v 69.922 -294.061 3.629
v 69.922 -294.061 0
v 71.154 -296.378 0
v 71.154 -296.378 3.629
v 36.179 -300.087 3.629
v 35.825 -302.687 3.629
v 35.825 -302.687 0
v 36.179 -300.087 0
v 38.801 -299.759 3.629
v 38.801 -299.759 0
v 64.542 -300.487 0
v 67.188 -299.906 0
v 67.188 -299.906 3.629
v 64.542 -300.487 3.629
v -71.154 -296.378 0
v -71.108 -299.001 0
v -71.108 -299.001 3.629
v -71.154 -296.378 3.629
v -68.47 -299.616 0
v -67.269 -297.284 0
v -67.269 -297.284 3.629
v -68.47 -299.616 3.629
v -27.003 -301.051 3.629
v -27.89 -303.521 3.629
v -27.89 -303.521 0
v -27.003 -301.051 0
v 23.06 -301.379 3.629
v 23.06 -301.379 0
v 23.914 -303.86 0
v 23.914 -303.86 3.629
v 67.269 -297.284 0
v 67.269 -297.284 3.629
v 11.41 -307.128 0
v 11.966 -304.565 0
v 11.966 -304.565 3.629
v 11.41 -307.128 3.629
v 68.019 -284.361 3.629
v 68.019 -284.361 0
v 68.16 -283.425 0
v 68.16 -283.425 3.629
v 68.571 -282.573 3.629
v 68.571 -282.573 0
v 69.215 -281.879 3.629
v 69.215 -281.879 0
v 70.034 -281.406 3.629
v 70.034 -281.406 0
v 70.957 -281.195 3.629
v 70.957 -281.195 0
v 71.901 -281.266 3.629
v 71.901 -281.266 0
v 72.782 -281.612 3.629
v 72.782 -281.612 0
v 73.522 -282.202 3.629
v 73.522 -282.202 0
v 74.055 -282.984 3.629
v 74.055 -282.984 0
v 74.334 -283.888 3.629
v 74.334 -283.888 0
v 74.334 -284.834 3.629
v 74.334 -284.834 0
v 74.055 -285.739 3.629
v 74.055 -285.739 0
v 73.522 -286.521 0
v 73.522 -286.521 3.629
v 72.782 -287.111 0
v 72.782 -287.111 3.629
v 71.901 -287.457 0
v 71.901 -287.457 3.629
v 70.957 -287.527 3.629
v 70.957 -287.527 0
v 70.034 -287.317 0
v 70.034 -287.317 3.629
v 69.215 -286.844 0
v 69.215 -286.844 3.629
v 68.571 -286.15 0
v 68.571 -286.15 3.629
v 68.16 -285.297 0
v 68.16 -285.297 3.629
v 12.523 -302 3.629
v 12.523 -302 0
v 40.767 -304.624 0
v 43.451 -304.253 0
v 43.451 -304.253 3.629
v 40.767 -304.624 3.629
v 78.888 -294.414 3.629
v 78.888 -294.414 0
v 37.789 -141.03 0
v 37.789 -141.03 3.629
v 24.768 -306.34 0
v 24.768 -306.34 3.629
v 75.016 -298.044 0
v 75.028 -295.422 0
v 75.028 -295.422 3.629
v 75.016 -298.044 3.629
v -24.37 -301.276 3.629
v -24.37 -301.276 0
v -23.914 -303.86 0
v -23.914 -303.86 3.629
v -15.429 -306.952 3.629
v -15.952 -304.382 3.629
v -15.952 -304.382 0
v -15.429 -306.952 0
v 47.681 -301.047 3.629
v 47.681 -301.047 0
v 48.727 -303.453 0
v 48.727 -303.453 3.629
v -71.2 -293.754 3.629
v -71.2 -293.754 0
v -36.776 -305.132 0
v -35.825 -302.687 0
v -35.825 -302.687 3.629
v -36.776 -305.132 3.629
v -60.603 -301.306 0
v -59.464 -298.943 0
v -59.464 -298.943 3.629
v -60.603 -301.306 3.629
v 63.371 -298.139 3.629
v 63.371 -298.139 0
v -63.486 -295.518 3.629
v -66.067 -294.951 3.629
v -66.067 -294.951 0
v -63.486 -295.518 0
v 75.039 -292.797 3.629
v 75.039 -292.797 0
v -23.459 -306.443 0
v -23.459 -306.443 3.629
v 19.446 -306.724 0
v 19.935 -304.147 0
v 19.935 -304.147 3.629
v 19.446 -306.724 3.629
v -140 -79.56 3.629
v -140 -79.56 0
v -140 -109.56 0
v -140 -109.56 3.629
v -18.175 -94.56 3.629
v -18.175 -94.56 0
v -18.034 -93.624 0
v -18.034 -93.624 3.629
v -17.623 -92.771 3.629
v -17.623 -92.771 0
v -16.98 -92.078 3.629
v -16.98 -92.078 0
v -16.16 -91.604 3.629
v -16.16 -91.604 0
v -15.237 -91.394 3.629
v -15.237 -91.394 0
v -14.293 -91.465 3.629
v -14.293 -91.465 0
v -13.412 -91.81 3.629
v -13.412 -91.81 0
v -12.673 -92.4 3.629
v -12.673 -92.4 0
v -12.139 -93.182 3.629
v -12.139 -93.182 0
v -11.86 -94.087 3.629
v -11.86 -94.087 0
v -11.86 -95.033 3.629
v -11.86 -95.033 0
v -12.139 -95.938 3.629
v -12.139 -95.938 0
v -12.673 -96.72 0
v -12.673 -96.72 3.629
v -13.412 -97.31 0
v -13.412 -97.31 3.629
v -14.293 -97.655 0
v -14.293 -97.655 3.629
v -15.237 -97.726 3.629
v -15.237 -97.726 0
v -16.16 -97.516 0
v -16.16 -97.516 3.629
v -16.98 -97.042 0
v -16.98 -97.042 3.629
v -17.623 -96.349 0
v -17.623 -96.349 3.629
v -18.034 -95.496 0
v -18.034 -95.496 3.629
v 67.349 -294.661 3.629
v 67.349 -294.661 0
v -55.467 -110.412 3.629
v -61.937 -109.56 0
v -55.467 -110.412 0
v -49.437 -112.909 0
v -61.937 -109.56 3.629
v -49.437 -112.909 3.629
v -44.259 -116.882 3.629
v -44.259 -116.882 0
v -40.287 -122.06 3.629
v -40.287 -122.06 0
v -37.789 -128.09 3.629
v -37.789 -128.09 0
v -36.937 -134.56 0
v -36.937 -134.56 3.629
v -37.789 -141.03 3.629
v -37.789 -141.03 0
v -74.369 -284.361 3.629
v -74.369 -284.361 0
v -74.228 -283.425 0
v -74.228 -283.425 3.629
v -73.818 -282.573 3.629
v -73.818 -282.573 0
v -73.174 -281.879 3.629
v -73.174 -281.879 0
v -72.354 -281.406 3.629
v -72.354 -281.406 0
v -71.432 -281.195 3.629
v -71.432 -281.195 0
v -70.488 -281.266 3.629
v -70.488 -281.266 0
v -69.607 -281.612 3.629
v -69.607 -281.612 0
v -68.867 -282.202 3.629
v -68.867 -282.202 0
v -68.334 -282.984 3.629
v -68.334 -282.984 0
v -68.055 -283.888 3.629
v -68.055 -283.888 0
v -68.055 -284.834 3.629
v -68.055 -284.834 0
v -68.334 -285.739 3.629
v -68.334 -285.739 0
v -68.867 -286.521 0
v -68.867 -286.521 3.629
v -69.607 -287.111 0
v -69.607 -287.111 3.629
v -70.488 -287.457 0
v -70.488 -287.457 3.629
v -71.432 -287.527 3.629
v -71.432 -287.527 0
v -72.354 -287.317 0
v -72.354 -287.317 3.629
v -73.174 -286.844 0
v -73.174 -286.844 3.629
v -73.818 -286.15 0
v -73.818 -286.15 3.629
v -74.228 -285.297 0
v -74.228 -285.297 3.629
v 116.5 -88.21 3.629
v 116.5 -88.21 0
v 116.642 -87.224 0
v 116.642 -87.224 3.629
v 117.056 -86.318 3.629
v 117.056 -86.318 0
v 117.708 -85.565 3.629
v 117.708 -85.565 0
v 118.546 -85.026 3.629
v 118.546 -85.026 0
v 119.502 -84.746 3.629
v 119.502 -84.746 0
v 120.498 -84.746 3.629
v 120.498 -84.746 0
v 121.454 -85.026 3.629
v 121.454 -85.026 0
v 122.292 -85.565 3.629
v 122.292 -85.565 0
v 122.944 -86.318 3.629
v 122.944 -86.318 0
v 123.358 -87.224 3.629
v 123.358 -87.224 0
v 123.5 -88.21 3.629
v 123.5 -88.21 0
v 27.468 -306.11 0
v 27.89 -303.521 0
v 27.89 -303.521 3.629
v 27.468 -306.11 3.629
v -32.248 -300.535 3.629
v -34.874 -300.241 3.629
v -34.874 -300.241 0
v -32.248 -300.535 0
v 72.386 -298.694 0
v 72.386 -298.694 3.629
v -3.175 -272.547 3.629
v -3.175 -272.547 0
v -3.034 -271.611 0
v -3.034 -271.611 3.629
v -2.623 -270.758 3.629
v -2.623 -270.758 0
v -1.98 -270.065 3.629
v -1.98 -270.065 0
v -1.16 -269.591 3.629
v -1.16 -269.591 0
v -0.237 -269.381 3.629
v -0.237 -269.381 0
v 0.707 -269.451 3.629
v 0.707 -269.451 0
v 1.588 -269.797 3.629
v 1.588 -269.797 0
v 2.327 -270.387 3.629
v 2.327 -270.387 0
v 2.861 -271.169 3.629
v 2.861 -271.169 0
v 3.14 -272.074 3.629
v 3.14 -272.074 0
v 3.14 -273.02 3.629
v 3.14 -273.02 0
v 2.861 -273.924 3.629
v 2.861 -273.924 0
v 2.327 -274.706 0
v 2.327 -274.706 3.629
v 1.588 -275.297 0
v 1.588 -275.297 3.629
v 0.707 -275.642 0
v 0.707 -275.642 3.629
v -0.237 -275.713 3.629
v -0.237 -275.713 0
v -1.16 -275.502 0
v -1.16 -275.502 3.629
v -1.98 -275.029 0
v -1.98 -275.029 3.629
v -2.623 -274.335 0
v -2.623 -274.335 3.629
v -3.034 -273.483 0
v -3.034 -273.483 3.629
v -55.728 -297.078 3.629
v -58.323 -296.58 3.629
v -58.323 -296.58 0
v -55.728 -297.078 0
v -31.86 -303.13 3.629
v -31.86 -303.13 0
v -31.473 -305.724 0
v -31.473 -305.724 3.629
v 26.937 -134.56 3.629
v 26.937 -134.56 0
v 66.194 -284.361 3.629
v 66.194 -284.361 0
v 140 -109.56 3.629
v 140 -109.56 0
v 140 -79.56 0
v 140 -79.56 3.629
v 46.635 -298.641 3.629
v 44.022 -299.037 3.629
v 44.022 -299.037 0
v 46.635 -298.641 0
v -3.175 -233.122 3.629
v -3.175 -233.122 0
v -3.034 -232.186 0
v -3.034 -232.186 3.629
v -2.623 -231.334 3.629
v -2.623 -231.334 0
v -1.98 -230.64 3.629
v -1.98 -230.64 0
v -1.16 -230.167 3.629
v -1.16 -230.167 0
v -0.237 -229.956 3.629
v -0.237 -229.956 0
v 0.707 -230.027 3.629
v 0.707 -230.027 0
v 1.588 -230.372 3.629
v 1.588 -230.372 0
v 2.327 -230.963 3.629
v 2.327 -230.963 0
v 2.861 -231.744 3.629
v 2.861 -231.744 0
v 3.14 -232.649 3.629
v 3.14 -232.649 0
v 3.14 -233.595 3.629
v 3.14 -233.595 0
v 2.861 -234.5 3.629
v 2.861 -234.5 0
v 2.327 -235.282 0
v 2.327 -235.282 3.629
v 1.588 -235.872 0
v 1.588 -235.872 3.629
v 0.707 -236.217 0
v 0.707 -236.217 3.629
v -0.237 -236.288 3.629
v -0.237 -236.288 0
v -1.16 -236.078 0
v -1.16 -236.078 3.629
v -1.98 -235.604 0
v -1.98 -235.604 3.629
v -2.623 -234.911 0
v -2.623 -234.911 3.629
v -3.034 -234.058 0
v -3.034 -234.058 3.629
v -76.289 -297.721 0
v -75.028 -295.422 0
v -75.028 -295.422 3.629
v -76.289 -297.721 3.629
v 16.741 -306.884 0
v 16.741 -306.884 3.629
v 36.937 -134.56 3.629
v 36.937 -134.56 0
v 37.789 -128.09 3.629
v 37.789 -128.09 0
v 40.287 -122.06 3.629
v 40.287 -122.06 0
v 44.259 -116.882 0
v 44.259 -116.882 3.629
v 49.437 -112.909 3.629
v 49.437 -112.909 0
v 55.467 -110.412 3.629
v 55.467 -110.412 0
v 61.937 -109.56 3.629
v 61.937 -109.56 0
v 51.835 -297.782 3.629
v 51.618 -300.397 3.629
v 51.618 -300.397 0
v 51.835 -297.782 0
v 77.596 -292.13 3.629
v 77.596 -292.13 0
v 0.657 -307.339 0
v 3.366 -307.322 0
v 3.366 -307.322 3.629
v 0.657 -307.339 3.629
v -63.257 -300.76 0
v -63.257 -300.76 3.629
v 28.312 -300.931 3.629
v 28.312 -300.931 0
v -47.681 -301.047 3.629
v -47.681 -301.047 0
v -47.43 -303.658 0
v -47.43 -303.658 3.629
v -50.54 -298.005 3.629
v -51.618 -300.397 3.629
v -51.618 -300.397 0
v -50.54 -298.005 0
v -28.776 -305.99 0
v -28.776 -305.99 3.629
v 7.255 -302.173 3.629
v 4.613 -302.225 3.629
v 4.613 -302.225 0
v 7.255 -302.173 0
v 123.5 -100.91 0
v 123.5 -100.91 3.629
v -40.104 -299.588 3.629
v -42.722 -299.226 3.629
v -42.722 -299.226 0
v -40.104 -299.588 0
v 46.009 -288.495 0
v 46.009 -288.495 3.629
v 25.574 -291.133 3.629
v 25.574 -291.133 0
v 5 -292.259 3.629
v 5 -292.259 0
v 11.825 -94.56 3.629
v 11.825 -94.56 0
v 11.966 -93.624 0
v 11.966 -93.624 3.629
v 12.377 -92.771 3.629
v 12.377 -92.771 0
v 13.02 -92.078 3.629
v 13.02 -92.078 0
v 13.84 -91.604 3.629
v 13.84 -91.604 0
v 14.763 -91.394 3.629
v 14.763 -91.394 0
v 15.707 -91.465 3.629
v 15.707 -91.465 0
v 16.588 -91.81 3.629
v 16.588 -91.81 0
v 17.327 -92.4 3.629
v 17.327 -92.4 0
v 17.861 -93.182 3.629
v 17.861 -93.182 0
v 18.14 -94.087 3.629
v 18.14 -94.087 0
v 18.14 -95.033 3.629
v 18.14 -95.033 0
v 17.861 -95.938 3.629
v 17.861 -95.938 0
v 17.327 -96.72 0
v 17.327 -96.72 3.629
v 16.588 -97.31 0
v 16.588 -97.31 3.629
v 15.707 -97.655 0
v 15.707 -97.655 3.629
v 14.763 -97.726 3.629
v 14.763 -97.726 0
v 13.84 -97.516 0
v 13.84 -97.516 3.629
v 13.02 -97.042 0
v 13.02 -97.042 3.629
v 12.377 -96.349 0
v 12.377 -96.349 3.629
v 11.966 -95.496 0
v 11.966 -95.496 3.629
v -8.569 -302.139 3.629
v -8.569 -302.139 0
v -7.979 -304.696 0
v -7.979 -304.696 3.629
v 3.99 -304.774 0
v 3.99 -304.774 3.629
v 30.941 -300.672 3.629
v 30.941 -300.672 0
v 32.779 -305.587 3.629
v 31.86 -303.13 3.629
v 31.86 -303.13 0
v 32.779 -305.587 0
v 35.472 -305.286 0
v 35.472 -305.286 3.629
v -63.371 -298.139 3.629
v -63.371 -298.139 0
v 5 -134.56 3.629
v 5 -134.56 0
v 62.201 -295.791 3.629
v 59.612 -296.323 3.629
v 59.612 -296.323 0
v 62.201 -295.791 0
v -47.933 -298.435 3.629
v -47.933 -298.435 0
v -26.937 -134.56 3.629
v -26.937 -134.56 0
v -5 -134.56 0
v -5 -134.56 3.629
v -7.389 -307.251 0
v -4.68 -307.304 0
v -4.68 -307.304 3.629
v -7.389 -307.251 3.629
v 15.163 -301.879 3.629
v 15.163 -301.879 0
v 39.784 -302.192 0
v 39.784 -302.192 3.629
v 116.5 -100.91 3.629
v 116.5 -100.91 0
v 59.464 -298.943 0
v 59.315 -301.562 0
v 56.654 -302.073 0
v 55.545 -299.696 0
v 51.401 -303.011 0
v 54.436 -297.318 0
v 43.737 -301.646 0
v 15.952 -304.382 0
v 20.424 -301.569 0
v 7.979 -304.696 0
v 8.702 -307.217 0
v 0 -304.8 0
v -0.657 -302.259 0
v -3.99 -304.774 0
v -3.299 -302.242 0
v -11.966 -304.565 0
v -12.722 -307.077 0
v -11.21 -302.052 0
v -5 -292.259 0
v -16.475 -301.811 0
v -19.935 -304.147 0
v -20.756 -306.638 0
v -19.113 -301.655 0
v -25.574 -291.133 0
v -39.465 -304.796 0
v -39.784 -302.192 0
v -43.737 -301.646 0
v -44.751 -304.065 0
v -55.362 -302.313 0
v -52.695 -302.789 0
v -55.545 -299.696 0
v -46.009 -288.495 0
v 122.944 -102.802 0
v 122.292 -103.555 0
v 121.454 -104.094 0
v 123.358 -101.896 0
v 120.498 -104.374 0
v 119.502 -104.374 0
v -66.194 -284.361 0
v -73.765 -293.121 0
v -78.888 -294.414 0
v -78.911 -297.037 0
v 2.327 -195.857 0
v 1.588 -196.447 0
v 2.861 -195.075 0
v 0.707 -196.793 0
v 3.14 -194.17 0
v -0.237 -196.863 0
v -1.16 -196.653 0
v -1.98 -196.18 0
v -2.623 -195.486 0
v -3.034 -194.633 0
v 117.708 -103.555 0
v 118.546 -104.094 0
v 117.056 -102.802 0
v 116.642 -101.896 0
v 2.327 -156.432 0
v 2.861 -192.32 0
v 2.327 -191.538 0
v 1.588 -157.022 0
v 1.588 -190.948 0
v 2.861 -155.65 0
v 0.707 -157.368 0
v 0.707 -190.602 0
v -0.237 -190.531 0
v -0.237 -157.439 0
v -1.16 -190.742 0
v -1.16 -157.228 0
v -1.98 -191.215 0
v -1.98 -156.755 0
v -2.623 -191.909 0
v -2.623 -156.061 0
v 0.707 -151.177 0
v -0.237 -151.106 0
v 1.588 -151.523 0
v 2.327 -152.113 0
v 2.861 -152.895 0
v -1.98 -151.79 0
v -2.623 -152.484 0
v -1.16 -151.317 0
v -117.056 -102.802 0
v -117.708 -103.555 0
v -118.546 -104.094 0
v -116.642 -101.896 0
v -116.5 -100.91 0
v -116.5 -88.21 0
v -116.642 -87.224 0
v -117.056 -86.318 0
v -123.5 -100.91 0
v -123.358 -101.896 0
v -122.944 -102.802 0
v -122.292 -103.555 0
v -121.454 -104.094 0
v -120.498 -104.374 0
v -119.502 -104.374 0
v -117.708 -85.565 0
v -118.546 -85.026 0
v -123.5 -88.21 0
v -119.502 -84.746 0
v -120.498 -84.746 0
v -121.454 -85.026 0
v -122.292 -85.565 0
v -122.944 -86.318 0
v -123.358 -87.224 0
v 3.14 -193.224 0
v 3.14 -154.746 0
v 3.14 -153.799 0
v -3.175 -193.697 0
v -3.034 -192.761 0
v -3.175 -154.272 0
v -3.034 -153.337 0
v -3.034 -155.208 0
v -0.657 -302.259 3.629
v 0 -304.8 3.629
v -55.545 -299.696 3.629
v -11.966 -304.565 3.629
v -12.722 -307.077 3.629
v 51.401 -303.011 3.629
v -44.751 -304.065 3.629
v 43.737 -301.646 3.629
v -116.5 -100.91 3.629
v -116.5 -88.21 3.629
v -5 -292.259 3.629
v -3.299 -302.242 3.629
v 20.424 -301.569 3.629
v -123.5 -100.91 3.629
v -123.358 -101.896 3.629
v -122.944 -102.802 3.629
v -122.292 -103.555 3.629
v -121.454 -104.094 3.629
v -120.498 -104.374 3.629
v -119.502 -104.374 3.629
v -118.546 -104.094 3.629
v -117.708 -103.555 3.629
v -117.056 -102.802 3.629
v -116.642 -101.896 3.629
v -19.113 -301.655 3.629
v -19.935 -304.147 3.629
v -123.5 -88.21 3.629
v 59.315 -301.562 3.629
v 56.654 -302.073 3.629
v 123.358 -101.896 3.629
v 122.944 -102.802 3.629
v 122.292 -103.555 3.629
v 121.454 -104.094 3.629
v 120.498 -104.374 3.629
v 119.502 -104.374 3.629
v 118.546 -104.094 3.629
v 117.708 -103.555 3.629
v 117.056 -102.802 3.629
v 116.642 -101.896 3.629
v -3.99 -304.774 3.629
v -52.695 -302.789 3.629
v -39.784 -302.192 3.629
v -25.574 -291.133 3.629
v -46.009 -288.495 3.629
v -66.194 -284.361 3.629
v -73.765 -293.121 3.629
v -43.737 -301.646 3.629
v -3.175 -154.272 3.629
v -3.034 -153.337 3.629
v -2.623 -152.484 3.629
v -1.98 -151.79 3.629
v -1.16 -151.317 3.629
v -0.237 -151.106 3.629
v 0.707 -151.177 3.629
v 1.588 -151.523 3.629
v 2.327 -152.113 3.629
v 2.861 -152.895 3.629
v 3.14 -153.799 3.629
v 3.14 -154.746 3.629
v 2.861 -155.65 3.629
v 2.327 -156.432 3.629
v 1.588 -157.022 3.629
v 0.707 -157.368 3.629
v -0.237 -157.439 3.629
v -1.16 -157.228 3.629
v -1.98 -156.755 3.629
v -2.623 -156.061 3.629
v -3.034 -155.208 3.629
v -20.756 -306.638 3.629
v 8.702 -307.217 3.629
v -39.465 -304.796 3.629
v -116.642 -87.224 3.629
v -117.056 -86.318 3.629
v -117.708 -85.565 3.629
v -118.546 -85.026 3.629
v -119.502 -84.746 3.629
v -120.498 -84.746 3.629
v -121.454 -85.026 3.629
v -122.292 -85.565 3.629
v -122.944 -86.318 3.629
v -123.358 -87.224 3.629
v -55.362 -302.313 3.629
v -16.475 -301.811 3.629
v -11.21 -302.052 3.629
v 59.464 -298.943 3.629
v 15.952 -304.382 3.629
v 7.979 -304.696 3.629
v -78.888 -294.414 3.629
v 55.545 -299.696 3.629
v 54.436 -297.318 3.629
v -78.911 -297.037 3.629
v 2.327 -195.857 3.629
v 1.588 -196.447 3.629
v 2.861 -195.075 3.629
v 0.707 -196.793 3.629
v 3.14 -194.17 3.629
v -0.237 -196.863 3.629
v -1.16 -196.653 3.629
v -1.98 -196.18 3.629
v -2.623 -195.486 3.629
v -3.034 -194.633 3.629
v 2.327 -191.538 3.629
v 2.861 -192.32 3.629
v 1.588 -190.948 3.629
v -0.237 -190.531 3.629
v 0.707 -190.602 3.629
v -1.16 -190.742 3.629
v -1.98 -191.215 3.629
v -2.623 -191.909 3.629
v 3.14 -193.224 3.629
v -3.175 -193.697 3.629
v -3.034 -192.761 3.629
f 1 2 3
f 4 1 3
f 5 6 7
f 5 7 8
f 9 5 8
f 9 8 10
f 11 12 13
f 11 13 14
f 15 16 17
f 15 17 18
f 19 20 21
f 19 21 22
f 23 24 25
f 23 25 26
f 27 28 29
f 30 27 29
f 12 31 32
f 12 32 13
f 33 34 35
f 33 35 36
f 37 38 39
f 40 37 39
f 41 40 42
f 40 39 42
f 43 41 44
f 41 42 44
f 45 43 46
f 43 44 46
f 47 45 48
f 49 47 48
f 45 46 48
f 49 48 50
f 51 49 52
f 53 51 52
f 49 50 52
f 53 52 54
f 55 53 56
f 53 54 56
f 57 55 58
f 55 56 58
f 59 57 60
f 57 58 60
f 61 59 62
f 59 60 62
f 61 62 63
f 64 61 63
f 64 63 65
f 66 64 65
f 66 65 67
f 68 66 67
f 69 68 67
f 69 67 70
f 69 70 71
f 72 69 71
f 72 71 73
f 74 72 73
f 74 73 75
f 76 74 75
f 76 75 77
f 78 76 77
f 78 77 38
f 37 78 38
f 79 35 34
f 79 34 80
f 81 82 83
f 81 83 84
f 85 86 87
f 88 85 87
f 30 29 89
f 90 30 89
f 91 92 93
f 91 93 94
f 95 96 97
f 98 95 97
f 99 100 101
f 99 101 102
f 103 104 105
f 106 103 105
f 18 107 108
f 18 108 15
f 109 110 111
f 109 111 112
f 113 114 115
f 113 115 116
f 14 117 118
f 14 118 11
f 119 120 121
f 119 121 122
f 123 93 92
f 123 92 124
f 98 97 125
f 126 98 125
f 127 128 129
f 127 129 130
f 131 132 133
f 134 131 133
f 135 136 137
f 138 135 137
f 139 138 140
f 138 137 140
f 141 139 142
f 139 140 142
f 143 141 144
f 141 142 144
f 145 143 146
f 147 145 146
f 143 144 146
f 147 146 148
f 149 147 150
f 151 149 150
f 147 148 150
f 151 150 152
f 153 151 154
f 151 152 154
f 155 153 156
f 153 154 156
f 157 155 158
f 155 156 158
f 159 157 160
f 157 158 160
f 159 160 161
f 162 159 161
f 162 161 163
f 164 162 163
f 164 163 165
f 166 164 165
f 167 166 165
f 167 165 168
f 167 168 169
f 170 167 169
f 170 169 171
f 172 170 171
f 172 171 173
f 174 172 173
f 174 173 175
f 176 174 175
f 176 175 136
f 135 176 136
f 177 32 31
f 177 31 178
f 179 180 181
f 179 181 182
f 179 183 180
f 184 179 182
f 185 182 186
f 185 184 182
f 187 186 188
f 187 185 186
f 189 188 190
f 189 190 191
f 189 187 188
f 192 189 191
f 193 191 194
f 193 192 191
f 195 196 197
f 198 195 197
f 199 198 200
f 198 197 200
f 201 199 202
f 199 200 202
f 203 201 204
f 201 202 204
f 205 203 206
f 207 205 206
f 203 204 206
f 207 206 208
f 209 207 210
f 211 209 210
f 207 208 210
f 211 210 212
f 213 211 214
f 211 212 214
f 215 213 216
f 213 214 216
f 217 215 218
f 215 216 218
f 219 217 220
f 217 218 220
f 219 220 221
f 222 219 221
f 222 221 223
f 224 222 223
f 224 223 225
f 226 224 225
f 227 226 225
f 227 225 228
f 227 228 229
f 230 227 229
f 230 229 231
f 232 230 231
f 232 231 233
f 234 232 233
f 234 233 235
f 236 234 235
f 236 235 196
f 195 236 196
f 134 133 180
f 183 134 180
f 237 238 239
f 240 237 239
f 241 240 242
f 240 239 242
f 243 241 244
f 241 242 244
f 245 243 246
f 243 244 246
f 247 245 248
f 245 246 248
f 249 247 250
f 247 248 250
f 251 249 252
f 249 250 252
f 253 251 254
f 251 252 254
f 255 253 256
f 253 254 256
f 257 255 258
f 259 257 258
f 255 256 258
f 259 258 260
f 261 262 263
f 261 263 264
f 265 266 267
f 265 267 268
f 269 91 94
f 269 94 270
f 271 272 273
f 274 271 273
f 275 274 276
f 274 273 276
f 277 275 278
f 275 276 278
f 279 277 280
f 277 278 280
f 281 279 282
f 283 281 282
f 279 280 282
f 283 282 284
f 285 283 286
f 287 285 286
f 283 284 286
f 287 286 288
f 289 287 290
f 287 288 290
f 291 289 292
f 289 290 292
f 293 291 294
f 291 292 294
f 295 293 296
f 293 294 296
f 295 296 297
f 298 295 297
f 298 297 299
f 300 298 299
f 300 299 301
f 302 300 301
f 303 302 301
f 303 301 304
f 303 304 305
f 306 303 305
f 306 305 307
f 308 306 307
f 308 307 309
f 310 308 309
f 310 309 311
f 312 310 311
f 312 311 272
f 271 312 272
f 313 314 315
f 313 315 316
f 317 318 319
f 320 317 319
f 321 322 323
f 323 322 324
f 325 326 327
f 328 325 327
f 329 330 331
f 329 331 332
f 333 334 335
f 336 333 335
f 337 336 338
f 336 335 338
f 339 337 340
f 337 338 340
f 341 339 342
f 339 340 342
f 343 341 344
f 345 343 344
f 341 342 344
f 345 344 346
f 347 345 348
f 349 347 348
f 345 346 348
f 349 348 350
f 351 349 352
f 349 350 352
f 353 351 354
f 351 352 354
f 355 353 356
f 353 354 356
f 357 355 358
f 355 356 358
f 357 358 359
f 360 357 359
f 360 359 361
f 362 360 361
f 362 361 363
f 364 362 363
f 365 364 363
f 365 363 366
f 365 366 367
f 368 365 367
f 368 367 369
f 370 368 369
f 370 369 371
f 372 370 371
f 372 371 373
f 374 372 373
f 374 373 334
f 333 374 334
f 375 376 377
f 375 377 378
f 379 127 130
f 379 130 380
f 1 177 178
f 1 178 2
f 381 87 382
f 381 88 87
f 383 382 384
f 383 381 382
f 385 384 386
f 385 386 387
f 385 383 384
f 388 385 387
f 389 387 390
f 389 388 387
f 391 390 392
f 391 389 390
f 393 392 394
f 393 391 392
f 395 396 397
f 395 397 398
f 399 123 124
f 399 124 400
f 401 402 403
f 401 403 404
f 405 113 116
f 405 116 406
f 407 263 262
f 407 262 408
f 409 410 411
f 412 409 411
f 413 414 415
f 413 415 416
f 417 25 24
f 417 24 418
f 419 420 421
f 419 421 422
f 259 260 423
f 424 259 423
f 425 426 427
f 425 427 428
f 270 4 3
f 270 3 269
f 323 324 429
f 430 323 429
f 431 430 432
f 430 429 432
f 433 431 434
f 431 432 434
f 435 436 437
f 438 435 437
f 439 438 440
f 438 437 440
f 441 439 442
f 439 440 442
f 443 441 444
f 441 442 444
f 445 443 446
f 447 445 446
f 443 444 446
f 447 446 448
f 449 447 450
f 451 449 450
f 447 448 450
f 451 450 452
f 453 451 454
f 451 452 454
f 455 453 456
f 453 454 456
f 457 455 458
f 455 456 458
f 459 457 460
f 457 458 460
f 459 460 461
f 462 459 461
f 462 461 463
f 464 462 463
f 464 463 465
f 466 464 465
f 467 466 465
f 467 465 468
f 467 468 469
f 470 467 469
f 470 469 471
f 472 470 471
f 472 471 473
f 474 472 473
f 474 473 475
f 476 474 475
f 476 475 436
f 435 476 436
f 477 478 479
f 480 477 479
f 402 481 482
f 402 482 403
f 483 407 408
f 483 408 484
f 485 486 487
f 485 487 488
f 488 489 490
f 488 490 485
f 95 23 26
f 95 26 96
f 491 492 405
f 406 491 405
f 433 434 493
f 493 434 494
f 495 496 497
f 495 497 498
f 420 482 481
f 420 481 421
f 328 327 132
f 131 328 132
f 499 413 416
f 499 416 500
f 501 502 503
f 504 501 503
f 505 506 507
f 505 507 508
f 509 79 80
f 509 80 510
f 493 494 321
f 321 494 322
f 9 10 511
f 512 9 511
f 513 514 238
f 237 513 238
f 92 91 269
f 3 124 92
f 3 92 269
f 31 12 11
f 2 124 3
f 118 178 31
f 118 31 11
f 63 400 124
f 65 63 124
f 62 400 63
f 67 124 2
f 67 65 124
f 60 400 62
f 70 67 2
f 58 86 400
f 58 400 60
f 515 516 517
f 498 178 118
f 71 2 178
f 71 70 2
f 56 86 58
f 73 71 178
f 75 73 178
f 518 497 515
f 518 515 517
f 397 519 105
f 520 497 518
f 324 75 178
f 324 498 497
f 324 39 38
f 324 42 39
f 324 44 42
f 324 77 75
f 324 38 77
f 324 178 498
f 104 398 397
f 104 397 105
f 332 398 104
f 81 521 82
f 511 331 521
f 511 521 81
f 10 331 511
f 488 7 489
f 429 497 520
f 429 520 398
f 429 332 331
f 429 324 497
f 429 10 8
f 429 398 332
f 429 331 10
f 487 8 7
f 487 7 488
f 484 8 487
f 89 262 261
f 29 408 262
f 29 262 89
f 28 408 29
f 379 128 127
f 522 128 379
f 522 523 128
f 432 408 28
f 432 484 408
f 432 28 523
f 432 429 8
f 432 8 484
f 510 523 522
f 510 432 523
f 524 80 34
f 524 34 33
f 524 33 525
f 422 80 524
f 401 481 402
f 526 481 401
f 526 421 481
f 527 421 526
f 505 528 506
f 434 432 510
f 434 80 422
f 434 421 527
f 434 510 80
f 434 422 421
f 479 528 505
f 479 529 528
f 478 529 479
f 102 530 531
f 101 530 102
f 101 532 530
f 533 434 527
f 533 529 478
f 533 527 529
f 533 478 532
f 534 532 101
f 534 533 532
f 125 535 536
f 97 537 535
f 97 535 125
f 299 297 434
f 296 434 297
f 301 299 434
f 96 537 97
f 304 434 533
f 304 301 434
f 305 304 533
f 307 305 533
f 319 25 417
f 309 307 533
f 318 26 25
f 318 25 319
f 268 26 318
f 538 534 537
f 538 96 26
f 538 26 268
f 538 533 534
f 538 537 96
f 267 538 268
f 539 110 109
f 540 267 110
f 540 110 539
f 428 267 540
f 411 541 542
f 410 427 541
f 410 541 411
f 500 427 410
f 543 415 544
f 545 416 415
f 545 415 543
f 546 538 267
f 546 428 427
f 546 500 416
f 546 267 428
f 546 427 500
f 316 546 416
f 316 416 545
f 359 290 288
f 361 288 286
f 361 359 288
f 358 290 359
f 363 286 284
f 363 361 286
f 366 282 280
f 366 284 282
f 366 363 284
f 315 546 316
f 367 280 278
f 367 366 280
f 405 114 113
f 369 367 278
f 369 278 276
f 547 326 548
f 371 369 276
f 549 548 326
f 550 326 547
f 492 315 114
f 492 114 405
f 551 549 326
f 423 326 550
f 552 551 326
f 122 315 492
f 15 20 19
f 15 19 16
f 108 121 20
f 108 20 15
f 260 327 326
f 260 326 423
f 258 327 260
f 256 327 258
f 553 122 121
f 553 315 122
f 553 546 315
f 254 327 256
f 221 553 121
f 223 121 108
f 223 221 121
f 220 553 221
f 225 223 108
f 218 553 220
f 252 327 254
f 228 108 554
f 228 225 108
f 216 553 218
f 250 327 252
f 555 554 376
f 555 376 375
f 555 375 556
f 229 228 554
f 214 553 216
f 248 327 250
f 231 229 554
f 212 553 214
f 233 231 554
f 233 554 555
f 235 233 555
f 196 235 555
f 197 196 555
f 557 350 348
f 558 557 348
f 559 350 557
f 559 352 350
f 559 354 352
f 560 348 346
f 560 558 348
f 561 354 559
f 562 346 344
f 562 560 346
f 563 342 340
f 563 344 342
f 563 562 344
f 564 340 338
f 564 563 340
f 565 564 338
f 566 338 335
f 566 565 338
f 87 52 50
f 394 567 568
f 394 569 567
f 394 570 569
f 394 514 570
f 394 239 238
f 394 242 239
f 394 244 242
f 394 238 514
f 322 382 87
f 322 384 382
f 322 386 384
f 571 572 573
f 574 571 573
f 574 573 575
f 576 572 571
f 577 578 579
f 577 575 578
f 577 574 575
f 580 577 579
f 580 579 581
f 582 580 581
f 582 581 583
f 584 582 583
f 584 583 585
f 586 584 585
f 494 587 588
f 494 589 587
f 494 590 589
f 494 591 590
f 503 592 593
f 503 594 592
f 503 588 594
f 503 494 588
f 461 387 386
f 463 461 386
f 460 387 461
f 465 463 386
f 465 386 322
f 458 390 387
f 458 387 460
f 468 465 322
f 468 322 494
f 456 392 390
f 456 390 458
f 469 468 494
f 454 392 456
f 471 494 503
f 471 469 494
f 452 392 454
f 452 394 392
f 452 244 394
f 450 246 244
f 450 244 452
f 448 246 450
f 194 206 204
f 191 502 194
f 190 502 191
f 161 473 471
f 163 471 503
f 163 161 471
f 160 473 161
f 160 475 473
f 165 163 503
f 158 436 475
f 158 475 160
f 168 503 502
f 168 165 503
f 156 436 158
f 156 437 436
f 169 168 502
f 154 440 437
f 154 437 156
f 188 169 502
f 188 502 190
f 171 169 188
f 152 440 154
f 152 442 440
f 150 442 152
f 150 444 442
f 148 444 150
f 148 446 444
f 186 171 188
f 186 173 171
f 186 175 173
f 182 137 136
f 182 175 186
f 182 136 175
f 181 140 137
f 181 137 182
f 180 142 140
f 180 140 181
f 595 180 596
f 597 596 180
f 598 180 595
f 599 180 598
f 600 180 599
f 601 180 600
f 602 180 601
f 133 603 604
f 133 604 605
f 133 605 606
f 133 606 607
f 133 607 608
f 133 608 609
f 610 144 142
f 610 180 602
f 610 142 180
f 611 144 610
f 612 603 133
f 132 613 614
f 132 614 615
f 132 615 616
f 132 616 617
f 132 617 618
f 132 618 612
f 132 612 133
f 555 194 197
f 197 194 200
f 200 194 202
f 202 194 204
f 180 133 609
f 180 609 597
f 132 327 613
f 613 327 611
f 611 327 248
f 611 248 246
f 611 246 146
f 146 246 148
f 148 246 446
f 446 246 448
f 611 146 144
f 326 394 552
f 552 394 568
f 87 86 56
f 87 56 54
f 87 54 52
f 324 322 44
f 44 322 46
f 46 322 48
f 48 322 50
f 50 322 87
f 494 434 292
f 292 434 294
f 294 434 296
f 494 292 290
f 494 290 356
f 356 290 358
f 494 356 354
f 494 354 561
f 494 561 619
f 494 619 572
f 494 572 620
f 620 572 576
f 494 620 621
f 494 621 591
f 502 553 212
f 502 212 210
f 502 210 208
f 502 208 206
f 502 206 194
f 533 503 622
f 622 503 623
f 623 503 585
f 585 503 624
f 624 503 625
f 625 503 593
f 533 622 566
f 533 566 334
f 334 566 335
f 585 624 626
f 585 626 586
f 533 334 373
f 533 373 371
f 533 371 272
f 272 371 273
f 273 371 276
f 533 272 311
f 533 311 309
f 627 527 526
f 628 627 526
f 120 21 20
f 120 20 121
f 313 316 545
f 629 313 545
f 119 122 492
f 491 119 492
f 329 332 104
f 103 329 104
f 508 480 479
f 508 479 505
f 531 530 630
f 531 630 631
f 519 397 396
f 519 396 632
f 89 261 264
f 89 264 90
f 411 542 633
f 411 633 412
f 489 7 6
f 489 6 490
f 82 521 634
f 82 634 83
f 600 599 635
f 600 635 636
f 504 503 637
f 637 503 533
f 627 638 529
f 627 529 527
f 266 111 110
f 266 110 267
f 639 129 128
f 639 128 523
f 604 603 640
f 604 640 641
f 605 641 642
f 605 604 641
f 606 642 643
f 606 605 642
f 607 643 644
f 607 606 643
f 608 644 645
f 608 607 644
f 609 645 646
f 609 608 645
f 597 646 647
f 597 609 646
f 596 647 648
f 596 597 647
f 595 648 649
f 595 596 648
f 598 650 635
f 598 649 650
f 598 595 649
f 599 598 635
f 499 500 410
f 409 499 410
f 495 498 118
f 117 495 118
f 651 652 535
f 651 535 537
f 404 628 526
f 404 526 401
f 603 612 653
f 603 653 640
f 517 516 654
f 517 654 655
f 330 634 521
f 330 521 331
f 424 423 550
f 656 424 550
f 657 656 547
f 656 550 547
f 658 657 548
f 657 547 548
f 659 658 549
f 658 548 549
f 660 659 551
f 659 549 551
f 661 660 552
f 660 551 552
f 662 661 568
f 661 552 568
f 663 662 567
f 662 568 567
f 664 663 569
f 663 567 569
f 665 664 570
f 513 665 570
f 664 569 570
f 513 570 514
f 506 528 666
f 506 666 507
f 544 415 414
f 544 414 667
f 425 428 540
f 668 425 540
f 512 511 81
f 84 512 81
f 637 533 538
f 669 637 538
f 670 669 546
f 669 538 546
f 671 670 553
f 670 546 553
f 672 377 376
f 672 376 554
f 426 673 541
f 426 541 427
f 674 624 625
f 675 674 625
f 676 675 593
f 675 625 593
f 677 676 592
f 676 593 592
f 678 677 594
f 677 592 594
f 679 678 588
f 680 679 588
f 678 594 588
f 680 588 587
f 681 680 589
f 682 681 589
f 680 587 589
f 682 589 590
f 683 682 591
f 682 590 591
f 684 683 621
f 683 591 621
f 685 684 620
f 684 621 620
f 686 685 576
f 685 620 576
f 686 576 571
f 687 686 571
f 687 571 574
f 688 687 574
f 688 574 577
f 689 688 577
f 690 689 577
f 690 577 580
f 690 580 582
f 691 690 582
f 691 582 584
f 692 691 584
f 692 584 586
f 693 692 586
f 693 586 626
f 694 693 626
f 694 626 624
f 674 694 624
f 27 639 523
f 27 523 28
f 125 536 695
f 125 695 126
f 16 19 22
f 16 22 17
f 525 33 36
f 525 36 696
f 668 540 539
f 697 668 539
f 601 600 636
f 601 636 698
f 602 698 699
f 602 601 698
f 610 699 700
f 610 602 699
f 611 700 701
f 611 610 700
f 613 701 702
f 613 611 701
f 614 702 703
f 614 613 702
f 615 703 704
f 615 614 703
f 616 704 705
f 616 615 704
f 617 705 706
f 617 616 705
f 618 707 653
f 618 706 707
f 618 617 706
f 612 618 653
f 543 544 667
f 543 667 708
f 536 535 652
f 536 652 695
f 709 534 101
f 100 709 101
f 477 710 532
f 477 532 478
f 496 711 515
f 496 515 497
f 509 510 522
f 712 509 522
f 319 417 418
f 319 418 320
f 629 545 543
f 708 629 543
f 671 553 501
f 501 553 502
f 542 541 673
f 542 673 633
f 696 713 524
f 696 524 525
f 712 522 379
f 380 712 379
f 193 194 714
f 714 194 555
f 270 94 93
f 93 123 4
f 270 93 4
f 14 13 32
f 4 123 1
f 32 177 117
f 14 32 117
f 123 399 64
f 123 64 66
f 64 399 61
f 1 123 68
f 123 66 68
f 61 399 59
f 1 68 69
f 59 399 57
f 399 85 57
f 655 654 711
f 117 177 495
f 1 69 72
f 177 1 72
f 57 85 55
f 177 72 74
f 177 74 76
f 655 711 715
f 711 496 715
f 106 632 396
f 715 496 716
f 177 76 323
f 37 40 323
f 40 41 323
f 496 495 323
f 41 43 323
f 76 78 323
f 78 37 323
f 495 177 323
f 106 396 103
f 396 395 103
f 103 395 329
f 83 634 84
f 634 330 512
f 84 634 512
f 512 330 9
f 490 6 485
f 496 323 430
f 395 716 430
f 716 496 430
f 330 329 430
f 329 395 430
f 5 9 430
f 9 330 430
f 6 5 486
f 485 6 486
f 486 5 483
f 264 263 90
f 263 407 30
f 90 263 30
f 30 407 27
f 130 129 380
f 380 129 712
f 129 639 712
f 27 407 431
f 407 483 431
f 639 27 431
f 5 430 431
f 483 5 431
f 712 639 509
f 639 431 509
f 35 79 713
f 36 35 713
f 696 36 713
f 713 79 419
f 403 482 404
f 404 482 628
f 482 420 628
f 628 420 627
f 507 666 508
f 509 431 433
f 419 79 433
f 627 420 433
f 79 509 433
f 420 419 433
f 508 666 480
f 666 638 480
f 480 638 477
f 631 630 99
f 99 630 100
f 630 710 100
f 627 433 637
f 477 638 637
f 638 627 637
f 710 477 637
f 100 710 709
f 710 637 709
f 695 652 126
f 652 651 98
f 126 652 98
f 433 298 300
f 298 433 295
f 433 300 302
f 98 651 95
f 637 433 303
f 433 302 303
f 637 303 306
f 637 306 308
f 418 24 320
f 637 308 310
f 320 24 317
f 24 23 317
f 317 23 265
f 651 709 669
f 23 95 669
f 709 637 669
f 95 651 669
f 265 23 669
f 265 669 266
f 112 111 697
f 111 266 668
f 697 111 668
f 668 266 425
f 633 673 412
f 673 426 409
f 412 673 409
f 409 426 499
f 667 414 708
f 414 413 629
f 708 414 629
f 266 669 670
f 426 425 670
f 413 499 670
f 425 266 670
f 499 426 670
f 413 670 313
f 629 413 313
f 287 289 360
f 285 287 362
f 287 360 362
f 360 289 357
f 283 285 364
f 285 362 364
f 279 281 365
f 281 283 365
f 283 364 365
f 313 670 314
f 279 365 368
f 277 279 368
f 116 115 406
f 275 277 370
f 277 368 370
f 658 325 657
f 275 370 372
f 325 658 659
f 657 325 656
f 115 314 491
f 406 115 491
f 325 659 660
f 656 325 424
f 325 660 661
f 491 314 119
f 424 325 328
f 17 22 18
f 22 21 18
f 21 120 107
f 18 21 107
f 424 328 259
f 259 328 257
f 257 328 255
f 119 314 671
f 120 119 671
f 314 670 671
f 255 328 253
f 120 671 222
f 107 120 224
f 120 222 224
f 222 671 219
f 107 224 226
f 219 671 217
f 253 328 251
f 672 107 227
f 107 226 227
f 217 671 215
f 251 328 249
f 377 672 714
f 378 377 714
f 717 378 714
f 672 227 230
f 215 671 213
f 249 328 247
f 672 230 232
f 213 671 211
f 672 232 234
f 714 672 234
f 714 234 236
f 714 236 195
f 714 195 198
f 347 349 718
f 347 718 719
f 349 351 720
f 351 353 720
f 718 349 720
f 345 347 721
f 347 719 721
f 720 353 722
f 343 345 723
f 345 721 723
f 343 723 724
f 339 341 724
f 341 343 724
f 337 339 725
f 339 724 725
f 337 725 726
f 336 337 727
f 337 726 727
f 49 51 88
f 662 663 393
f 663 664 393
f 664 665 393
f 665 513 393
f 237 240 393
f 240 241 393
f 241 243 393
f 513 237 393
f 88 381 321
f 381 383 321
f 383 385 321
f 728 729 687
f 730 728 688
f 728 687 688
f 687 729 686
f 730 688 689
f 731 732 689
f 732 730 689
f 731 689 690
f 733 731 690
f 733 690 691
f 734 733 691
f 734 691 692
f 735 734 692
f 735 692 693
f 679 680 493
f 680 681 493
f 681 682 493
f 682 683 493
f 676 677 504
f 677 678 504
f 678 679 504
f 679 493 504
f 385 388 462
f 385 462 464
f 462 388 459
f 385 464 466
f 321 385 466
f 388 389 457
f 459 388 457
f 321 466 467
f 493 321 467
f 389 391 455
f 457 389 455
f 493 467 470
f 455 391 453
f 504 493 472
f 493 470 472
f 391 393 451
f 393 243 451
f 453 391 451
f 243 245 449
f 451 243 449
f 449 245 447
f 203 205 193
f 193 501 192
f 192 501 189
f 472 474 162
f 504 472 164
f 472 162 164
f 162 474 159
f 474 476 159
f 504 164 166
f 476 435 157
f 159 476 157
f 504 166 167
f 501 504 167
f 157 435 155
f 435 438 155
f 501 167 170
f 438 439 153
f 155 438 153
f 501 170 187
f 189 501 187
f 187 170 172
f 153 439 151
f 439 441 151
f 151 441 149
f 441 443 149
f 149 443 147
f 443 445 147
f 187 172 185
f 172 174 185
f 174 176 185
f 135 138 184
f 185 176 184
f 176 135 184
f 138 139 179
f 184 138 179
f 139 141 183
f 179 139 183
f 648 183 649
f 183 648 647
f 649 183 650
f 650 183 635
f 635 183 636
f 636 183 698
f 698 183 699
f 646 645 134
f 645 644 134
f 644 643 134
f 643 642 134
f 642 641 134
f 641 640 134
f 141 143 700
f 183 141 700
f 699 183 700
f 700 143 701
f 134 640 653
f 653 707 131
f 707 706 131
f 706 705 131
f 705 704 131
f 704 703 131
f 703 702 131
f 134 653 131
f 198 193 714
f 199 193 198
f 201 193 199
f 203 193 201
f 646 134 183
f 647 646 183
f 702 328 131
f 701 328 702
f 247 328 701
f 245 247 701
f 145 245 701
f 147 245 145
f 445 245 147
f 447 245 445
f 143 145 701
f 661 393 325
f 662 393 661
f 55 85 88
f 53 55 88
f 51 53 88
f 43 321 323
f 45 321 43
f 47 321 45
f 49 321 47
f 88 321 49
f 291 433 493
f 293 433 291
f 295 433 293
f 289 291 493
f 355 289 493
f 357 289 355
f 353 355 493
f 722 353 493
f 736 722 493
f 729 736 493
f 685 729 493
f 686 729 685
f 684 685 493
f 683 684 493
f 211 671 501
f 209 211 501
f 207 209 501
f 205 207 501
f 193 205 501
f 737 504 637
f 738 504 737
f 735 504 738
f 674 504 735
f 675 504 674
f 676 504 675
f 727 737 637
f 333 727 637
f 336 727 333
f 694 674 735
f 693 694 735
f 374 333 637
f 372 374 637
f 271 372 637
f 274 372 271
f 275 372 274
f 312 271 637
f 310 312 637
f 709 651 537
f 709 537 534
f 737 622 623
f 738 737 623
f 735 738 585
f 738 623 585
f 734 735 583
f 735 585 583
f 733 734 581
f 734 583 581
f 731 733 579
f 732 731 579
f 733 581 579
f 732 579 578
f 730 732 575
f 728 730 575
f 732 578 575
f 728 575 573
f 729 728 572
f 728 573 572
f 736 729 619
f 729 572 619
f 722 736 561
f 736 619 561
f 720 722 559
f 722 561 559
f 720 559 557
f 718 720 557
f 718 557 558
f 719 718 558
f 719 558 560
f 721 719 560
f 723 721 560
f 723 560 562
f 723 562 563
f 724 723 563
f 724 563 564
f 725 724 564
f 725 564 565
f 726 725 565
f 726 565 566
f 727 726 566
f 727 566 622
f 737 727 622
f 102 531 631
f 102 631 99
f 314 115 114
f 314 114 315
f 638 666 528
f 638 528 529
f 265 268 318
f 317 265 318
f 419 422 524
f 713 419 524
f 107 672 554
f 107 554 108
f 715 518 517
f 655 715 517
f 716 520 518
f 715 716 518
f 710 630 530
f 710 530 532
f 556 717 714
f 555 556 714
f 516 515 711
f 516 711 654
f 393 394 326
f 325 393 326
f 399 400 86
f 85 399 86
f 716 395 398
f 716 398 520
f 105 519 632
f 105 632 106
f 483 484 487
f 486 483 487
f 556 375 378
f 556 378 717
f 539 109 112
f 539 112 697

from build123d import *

# Parameters (mm, degrees)
BOSS_EXTRUDE2_DEPTH = 3.628571429
FILLET1_R           = 25
BOSS_EXTRUDE4_DEPTH = 3.628571429
CUT_EXTRUDE2_DEPTH  = 336.434355024
CIRPATTERN8_COUNT   = 20
CIRPATTERN8_ANGLE   = 28.5
SKETCH5_R           = 3.175
CUT_EXTRUDE3_DEPTH  = 338.743409804
SKETCH17_R          = 3.175
CUT_EXTRUDE4_DEPTH  = 338.743409804


with BuildPart() as part:
    # Sketch3 → Boss-Extrude2 (new body)
    with BuildSketch(Plane.XY):
        with BuildLine():
            Line((-140, -79.56), (-140, -109.56))
            Line((-140, -109.56), (-29.356513523, -109.56))
            Line((-29.356513523, -109.56), (-78.888044947, -294.414191853))
            ThreePointArc((-78.888044947, -294.414191853), (0, -304.8), (78.888044947, -294.414191853))
            Line((78.888044947, -294.414191853), (29.356513523, -109.56))
            Line((29.356513523, -109.56), (140, -109.56))
            Line((140, -109.56), (140, -79.56))
            Line((140, -79.56), (-140, -79.56))
        make_face()
    extrude(amount=BOSS_EXTRUDE2_DEPTH)

    # Fillet1
    fillet1_edges = [part.edges().sort_by_distance(p)[0] for p in [
        (29.356513523, -109.56, 1.814285714),
        (-29.356513523, -109.56, 1.814285714),
    ]]
    fillet(fillet1_edges, radius=FILLET1_R)

    # Sketch14 → Boss-Extrude4 (add)
    with BuildSketch(Plane(origin=(0, 0, 0), x_dir=(-1, 0, 0), z_dir=(0, 0, -1))):
        with BuildLine():
            Line((78.910933272, -297.036934084), (78.888044947, -294.414191853))
            ThreePointArc((78.888044947, -294.414191853), (76.959432674, -294.924203351), (75.027523715, -295.421581279))
            Line((75.027523715, -295.421581279), (76.289081309, -297.721097125))
            Line((76.289081309, -297.721097125), (78.910933272, -297.036934084))
        make_face()
    boss_extrude4 = extrude(amount=-BOSS_EXTRUDE4_DEPTH)

    # Sketch16 → Cut-Extrude2 (cut, symmetric)
    with BuildSketch(Plane(origin=(0, 0, 0), x_dir=(-1, 0, 0), z_dir=(0, 0, -1))):
        Polygon((372.937709596, -838.440145613), (75.027523715, -295.421581279), (73.765262731, -293.12078332), (71.19993834, -293.754449124), (71.154137831, -296.378353915), (60.344615656, -915.654378233), (357.400151379, -2118.250141136), (669.993245319, -2041.035908516), align=None)
    cut_extrude2 = extrude(amount=CUT_EXTRUDE2_DEPTH, both=True, mode=Mode.SUBTRACT)

    # CirPattern8: Boss-Extrude4, Cut-Extrude2 ×20 about axis
    cirpattern8_axis = Axis((0, 0, 0), (0, 0, 1))
    add([boss_extrude4.rotate(cirpattern8_axis, i * CIRPATTERN8_ANGLE / (CIRPATTERN8_COUNT - 1)) for i in range(1, CIRPATTERN8_COUNT)])
    add([cut_extrude2.rotate(cirpattern8_axis, i * CIRPATTERN8_ANGLE / (CIRPATTERN8_COUNT - 1)) for i in range(1, CIRPATTERN8_COUNT)], mode=Mode.SUBTRACT)

    # Sketch5 → Cut-Extrude3 (cut, through all)
    with BuildSketch(Plane(origin=(0, 0, 0), x_dir=(-1, 0, 0), z_dir=(0, 0, -1))):
        with Locations((-15, -94.56)):
            Circle(SKETCH5_R)
        with Locations((15, -94.56)):
            Circle(SKETCH5_R)
        with BuildLine():
            Line((-123.5, -94.56), (-123.5, -100.91))
            ThreePointArc((-123.5, -100.91), (-120, -104.41), (-116.5, -100.91))
            Line((-116.5, -100.91), (-116.5, -94.56))
            Line((-116.5, -94.56), (-116.5, -88.21))
            ThreePointArc((-116.5, -88.21), (-120, -84.71), (-123.5, -88.21))
            Line((-123.5, -88.21), (-123.5, -94.56))
        make_face()
        with BuildLine():
            Line((116.5, -94.56), (116.5, -88.21))
            ThreePointArc((116.5, -88.21), (120, -84.71), (123.5, -88.21))
            Line((123.5, -88.21), (123.5, -94.56))
            Line((123.5, -94.56), (123.5, -100.91))
            ThreePointArc((123.5, -100.91), (120, -104.41), (116.5, -100.91))
            Line((116.5, -100.91), (116.5, -94.56))
        make_face()
    extrude(amount=-CUT_EXTRUDE3_DEPTH, mode=Mode.SUBTRACT)

    # Sketch17 → Cut-Extrude4 (cut, through all)
    with BuildSketch(Plane(origin=(0, 0, 0), x_dir=(-1, 0, 0), z_dir=(0, 0, -1))):
        with BuildLine():
            Line((66.194365296, -284.361242536), (26.937147844, -134.56))
            Line((26.937147844, -134.56), (5, -134.56))
            Line((5, -134.56), (5, -292.259285824))
            ThreePointArc((5, -292.259285824), (35.815557854, -290.00224429), (66.194365296, -284.361242536))
        make_face()
        with BuildLine():
            ThreePointArc((-66.194365296, -284.361242536), (-35.815557854, -290.00224429), (-5, -292.259285824))
            Line((-5, -292.259285824), (-5, -134.56))
            Line((-5, -134.56), (-26.937147844, -134.56))
            Line((-26.937147844, -134.56), (-66.194365296, -284.361242536))
        make_face()
        with Locations((0, -272.546875096)):
            Circle(SKETCH17_R)
        with Locations((0, -233.12205364)):
            Circle(SKETCH17_R)
        with Locations((0, -193.697232184)):
            Circle(SKETCH17_R)
        with Locations((0, -154.272410728)):
            Circle(SKETCH17_R)
        with Locations((-71.194365296, -284.361242536)):
            Circle(SKETCH17_R)
        with Locations((71.194365296, -284.361242536)):
            Circle(SKETCH17_R)
    extrude(amount=-CUT_EXTRUDE4_DEPTH, mode=Mode.SUBTRACT)


solid = part.part
